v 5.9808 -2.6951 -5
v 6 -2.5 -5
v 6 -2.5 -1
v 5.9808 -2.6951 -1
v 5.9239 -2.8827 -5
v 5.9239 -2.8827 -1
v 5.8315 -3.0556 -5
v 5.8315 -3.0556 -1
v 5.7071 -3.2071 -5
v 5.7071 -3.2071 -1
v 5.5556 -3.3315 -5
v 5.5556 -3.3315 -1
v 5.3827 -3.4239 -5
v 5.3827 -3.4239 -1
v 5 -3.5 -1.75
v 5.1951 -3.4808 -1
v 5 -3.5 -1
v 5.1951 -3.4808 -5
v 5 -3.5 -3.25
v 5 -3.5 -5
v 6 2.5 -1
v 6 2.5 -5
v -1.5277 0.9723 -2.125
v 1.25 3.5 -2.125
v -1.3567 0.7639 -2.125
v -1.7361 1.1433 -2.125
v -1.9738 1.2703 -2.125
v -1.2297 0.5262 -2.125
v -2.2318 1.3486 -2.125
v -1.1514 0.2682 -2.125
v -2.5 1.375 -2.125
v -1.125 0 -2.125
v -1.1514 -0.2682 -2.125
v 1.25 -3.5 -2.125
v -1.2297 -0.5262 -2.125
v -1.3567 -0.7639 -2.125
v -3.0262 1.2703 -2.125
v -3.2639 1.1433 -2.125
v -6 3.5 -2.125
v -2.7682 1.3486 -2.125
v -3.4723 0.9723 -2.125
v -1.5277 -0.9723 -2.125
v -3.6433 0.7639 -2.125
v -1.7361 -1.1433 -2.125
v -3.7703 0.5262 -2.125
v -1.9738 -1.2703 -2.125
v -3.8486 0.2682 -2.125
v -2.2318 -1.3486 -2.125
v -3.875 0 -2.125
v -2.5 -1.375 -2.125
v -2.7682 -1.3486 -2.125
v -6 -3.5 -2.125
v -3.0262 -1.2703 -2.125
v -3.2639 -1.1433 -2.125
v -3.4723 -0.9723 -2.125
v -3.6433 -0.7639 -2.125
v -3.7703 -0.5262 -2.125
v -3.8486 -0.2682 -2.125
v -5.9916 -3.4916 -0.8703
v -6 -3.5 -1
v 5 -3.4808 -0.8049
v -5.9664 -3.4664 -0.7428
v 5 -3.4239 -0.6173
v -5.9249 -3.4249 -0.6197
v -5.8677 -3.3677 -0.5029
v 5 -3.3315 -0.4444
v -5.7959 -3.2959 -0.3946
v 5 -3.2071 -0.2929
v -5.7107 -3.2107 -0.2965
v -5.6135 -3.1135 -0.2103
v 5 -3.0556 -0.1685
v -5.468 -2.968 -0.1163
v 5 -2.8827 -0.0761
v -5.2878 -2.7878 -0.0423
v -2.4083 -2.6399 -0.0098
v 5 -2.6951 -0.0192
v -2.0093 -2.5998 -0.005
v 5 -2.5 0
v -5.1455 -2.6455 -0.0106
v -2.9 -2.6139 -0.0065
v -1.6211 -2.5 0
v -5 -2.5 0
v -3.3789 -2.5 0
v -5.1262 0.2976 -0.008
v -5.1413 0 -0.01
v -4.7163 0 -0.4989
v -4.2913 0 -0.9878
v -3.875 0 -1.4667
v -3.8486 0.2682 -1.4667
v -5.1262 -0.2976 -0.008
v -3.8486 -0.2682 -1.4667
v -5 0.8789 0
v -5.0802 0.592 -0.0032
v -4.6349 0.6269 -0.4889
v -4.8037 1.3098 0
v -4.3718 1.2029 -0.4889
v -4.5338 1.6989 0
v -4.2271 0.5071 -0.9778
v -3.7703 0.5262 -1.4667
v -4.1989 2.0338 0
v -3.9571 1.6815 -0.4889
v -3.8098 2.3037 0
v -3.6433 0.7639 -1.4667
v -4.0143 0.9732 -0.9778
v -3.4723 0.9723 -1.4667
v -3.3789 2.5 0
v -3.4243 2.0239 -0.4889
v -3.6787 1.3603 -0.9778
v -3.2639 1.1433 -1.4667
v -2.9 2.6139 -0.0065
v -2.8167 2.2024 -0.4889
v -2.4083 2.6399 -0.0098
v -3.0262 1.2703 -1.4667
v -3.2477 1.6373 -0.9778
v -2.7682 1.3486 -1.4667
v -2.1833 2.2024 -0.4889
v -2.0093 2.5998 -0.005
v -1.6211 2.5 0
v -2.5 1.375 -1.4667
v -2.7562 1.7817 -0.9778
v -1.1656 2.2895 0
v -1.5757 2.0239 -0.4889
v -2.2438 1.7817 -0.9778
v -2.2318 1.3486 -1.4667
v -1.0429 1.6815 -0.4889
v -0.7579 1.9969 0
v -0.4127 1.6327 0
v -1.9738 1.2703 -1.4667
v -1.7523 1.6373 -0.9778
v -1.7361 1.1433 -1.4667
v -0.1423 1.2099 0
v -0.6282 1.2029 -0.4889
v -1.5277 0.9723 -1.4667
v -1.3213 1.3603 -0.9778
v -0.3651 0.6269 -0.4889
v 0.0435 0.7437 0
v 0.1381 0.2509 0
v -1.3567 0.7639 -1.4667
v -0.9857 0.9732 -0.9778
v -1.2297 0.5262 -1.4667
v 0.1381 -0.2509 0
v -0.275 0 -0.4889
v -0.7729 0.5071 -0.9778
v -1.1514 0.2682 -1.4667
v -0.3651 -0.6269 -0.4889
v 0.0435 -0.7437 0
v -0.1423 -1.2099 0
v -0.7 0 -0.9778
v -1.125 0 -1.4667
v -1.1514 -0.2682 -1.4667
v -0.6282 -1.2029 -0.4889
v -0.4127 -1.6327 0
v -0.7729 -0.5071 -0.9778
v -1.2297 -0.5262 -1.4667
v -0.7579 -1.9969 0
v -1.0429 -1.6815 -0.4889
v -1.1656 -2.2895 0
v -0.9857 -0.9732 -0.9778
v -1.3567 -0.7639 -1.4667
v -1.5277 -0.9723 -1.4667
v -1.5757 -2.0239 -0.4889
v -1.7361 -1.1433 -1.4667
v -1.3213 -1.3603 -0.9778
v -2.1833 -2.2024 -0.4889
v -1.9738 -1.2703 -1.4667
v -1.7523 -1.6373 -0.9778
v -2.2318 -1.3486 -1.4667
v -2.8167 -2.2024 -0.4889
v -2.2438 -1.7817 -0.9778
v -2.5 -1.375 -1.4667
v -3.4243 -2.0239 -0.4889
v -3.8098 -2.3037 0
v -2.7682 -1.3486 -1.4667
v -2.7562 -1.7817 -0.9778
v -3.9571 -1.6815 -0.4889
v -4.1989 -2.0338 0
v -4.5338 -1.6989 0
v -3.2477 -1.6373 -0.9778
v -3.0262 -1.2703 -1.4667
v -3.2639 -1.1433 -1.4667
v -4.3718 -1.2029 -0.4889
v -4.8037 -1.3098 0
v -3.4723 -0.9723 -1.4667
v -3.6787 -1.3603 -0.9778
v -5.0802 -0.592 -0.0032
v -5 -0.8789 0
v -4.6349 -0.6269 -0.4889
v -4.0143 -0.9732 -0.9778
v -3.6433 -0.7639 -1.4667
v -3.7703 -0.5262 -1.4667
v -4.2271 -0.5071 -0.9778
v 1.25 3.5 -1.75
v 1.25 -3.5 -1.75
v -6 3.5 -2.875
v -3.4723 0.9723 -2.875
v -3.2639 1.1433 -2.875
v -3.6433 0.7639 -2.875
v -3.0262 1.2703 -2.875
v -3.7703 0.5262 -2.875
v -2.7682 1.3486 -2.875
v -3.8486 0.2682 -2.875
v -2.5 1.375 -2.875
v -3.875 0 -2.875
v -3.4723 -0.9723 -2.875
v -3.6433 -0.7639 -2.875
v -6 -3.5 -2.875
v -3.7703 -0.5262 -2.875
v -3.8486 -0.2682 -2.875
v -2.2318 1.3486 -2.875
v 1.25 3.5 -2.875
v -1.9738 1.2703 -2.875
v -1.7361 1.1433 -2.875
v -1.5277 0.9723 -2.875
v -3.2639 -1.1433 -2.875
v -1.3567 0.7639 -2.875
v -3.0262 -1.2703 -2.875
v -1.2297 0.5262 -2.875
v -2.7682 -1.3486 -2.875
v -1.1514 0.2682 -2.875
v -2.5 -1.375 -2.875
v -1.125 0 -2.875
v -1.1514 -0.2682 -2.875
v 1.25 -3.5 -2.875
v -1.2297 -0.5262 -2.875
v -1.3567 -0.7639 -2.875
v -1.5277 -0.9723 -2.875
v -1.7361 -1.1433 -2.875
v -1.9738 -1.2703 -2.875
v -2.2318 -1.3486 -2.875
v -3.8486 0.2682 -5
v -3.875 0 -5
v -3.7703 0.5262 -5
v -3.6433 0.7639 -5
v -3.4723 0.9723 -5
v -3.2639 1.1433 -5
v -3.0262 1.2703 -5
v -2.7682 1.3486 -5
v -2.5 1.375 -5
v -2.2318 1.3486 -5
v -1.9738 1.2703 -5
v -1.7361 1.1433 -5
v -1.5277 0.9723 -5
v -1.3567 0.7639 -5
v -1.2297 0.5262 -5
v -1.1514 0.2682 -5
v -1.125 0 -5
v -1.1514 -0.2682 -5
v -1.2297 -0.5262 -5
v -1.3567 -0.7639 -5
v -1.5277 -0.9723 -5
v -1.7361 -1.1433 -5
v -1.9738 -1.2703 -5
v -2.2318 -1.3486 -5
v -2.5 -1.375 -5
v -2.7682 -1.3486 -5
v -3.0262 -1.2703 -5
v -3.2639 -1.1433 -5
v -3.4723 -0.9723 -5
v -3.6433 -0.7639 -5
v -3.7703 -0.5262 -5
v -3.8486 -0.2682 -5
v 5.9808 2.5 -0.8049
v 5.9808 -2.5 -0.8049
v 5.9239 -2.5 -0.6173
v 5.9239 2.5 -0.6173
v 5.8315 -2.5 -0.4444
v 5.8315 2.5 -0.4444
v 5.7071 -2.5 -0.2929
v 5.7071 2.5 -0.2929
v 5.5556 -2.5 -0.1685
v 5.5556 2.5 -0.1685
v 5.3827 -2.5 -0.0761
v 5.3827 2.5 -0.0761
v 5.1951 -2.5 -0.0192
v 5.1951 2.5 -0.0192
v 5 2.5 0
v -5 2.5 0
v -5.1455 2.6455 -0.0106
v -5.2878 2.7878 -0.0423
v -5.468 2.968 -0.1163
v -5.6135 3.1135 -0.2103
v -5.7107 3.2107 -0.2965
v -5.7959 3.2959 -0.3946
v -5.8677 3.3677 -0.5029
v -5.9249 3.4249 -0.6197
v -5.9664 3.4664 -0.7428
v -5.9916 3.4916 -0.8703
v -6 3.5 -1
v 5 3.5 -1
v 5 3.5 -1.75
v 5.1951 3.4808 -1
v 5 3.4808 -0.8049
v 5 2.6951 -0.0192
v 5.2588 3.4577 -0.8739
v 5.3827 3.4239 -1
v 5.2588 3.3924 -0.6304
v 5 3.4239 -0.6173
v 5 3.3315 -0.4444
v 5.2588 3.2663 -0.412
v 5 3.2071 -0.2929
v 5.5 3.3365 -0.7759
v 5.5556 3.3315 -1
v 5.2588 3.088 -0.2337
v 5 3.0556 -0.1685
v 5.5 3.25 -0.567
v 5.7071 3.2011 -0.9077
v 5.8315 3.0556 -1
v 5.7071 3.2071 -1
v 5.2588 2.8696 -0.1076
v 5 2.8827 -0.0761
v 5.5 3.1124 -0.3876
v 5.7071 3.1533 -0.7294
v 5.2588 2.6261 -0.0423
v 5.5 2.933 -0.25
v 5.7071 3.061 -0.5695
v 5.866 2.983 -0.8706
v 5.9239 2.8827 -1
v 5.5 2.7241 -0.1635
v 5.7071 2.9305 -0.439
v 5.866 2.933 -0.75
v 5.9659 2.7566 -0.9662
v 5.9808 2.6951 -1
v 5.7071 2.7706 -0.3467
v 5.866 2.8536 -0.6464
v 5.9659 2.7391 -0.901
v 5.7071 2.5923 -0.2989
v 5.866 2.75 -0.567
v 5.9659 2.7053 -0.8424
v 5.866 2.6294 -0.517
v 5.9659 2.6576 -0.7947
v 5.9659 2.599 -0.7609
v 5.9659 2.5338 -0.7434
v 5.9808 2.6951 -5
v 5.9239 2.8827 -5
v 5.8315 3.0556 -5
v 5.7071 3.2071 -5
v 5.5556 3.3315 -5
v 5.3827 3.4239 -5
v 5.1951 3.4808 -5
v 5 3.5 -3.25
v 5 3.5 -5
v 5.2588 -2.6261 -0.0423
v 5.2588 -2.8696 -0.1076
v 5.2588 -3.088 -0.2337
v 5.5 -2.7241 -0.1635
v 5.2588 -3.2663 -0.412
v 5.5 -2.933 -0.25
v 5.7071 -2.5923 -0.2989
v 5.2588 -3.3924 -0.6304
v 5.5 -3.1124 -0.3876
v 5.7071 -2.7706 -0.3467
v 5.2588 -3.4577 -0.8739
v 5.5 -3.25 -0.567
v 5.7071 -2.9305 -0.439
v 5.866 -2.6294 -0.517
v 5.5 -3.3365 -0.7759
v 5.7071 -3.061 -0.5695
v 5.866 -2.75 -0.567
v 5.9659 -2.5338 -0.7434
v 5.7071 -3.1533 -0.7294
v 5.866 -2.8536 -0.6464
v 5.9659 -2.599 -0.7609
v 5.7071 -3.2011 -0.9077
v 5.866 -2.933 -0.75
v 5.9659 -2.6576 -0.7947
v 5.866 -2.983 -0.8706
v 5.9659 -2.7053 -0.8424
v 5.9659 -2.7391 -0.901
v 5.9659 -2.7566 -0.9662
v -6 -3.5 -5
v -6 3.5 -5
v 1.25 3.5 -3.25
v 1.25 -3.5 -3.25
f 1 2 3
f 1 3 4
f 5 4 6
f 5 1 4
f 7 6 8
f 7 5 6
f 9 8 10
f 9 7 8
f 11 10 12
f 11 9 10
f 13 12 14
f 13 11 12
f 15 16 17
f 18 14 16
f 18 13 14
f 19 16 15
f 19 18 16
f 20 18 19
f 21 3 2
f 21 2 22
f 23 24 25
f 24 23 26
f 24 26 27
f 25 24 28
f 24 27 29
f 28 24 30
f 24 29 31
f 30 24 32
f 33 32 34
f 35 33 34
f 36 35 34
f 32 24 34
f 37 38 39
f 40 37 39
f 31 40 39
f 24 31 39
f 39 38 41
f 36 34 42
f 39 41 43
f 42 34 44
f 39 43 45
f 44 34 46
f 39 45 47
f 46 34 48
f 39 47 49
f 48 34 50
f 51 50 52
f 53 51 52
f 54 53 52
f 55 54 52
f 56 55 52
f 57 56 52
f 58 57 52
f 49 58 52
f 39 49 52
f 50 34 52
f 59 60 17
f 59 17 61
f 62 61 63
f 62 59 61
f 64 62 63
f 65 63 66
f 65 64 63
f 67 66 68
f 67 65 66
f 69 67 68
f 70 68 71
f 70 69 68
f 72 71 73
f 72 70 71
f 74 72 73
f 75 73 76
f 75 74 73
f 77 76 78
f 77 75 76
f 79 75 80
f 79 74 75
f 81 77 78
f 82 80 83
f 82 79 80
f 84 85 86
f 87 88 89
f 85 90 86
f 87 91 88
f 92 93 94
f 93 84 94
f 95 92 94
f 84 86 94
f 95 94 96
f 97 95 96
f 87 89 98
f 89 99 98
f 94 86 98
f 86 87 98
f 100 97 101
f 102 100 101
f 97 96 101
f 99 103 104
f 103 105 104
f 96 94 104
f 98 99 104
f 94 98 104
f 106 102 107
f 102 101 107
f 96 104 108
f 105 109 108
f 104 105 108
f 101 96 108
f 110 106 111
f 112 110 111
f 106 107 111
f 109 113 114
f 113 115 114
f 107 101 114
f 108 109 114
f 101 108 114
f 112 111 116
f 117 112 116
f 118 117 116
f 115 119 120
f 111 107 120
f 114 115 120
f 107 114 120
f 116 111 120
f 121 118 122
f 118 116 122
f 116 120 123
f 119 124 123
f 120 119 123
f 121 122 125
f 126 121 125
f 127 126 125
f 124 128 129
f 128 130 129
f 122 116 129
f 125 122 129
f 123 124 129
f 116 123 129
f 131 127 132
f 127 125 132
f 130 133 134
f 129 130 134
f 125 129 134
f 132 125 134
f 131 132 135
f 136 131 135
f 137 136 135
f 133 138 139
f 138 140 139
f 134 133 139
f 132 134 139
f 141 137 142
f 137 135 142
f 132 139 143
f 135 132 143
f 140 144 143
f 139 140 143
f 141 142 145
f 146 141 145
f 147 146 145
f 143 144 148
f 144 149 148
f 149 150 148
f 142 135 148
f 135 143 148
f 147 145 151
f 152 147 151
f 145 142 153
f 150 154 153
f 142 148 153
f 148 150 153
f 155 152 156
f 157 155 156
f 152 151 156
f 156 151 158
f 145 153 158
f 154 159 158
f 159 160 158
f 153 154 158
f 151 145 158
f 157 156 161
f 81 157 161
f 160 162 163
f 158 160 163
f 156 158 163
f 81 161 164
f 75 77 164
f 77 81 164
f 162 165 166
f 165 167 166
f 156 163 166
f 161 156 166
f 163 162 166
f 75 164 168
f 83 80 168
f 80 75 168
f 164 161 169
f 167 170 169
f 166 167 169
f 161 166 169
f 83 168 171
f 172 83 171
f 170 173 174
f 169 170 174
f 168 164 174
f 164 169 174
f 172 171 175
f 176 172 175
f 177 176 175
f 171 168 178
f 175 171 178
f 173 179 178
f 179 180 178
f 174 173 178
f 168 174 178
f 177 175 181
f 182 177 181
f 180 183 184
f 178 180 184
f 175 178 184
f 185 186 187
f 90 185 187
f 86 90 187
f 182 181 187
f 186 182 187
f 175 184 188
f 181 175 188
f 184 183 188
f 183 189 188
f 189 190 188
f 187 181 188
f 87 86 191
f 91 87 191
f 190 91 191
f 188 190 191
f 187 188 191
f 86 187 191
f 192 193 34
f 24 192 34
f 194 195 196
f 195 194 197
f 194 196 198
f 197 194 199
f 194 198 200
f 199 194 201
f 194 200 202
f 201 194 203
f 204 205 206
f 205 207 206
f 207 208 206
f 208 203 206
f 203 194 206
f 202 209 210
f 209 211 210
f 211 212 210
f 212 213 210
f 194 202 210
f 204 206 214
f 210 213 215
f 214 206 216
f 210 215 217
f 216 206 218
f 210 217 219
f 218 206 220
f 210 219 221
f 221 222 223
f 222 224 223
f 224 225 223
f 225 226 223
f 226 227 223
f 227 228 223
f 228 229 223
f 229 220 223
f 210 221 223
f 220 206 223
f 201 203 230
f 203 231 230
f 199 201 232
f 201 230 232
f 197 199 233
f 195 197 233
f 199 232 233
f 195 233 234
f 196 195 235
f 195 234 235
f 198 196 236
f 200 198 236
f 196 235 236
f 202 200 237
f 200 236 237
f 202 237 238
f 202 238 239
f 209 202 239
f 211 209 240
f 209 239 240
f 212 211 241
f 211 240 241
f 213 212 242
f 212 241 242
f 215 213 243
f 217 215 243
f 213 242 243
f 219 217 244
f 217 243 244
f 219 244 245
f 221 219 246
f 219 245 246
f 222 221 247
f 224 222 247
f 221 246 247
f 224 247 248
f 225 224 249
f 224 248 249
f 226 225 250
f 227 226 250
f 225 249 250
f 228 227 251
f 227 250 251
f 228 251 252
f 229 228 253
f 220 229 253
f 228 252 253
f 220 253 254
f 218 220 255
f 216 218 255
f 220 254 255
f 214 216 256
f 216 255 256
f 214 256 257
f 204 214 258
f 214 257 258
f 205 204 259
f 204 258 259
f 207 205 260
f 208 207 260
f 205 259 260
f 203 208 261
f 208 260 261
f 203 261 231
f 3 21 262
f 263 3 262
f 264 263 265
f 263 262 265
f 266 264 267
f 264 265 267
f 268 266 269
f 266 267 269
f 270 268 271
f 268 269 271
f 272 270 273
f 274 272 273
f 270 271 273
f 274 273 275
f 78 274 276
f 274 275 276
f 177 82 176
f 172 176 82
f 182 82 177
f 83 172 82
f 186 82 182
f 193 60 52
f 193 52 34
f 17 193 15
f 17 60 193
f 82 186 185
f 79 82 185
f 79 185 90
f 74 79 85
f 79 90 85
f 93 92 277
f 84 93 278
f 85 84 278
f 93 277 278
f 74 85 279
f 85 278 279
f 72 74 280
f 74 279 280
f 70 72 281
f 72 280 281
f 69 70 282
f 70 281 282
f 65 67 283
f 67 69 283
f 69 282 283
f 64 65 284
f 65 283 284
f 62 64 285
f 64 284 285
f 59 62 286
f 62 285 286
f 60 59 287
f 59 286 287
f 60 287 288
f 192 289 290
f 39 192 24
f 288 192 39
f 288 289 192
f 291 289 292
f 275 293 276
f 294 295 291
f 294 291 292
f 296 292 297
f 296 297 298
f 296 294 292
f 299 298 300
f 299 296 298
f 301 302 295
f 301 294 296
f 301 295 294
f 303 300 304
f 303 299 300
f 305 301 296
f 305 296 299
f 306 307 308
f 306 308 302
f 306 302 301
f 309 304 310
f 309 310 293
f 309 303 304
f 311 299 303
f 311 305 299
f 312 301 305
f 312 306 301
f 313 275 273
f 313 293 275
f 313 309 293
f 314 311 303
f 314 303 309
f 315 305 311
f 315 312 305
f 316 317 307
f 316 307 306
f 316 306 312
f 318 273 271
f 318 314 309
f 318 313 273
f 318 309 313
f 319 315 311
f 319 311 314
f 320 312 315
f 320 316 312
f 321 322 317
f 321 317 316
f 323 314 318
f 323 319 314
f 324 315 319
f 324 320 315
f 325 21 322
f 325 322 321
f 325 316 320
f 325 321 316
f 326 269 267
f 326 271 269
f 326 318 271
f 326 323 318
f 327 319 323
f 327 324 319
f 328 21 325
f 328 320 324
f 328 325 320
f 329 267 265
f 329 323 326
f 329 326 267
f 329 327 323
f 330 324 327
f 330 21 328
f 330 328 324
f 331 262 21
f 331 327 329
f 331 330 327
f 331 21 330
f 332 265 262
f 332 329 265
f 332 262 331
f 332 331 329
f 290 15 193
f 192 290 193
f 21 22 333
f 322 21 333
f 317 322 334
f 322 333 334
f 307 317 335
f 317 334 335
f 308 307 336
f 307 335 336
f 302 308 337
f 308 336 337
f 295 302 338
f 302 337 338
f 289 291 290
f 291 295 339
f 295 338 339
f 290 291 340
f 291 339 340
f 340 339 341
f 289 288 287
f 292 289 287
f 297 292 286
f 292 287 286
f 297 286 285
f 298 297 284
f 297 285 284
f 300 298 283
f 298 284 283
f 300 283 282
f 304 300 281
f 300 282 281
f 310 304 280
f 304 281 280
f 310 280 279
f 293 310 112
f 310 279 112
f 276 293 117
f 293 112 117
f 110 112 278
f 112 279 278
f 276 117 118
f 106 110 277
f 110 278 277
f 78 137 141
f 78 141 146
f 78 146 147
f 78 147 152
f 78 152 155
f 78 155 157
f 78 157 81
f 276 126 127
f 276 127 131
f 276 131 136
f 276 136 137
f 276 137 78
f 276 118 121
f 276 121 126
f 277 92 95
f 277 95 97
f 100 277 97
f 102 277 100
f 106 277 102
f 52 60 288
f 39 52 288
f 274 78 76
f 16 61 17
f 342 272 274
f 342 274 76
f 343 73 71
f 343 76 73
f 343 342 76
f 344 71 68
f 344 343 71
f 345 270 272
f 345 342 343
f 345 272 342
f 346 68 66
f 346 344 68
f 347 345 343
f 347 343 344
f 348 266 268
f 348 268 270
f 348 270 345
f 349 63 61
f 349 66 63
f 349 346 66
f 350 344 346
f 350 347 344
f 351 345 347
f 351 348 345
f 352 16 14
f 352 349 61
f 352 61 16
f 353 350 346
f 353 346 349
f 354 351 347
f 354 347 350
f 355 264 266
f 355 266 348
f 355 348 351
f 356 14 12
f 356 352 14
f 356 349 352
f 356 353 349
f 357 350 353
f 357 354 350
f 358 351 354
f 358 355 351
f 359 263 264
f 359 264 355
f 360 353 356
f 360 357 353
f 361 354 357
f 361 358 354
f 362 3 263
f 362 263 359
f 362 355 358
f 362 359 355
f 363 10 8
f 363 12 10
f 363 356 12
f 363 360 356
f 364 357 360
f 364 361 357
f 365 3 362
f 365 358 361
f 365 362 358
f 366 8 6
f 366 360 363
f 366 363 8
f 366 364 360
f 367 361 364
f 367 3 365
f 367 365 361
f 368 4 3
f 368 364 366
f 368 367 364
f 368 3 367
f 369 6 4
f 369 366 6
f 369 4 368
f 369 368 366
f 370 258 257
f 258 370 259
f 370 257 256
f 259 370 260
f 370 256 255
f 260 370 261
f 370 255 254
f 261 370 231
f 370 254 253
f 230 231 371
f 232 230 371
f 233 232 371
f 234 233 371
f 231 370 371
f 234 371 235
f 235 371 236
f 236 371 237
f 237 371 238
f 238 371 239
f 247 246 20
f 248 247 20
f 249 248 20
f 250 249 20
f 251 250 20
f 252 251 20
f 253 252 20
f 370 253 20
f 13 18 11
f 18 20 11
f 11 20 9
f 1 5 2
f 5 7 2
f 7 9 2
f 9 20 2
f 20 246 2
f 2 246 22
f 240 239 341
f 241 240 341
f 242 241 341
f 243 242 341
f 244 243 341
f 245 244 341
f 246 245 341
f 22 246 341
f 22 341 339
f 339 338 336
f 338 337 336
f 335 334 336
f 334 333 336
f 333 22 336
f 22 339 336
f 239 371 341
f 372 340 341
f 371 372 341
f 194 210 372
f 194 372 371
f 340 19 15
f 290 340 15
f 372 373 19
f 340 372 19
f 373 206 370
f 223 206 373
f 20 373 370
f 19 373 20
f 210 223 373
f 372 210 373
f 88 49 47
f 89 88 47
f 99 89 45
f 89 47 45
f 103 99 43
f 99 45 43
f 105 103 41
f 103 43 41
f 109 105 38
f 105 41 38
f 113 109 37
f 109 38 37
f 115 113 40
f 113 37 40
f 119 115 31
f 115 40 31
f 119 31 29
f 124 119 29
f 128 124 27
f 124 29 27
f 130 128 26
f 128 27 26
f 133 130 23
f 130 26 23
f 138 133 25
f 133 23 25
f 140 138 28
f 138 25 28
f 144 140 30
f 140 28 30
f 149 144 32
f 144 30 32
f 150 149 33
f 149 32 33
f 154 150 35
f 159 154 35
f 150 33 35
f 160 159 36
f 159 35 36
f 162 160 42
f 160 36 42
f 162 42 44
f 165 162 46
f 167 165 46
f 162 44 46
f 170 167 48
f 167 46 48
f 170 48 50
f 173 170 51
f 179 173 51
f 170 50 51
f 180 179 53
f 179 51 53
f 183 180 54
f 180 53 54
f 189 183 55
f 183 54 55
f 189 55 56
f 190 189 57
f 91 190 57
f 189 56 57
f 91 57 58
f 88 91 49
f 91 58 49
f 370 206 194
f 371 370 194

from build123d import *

# Parameters (mm, degrees)
F0_W           = 5
F0_H           = 7
F0_W_2         = 7
F1_DEPTH       = 5
F3_D           = 2.75
F3_CSINK_D     = 5.3
F3_CSINK_ANGLE = 82
F5_DEPTH       = 7
F6_T1_DEPTH    = 12
F6_T3_DEPTH    = 13.5
F6_T5_DEPTH    = 5
F6_T7_DEPTH    = 6.5
F6_S11_W       = 1
F6_S11_H       = 1
F6_T12_DEPTH   = 1
F6_S17_W       = 1
F6_S17_H       = 1
F6_T18_DEPTH   = 1


# Not quite as in the source:
# - a fillet or chamfer that OpenCascade refuses, or shapes differently, is made with other operations: its cross-section is extruded or revolved along the edge and cut away or added


with BuildPart() as f1:
    # F0 (on Top) → F1 (new body)
    with BuildSketch(Plane.XY):
        with Locations((3.5, 0)):
            Rectangle(F0_W, F0_H)
        with Locations((-2.5, 0)):
            Rectangle(F0_W_2, F0_H)
    extrude(amount=-F1_DEPTH)

    # F3 (through all)
    with Locations(Plane.XY):
        with Locations((-2.5, 0)):
            CounterSinkHole(F3_D / 2, F3_CSINK_D / 2, counter_sink_angle=F3_CSINK_ANGLE)

    # F4 (on face) → F5 (cut, through all)
    with BuildSketch(Plane.XZ.offset(3.5)):
        Polygon((1.25, -3.25), (4.9999998882, -3.25), (4.9999998882, -1.75), (1.25, -1.75), (1.25, -2.125), (-6, -2.125), (-6, -2.875), (1.25, -2.875), align=None)
    extrude(amount=-F5_DEPTH, mode=Mode.SUBTRACT)

    # F6: fillet of radius 1 on 6 edges, made by hand

    # F6_s2 → F6_t1 (cut)
    with BuildSketch(Plane.XZ.offset(-6)):
        with BuildLine():
            ThreePointArc((-5, 0), (-5.7071067812, -0.2928932188), (-6, -1))
            Line((-6, -1), (-6, 0))
            Line((-6, 0), (-5, 0))
        make_face()
    extrude(amount=F6_T1_DEPTH, mode=Mode.SUBTRACT)

    # F6_s4 → F6_t3 (cut)
    with BuildSketch(Plane.YZ.offset(-8.5)):
        with BuildLine():
            ThreePointArc((3.5, -1), (3.2071067812, -0.2928932188), (2.5, 0))
            Line((2.5, 0), (3.5, 0))
            Line((3.5, 0), (3.5, -1))
        make_face()
        with BuildLine():
            ThreePointArc((-3.5, -1), (-3.2071067812, -0.2928932188), (-2.5, 0))
            Line((-2.5, 0), (-3.5, 0))
            Line((-3.5, 0), (-3.5, -1))
        make_face()
    extrude(amount=F6_T3_DEPTH, mode=Mode.SUBTRACT)

    # F6_s6 → F6_t5 (cut)
    with BuildSketch(Plane.XZ.offset(-2.5)):
        with BuildLine():
            ThreePointArc((6, -1), (5.7071067812, -0.2928932188), (5, 0))
            Line((5, 0), (6, 0))
            Line((6, 0), (6, -1))
        make_face()
    extrude(amount=F6_T5_DEPTH, mode=Mode.SUBTRACT)

    # F6_s8 → F6_t7 (cut)
    with BuildSketch(Plane.XY.offset(-7.5)):
        with BuildLine():
            ThreePointArc((6, -2.5), (5.7071067812, -3.2071067812), (5, -3.5))
            Line((5, -3.5), (6, -3.5))
            Line((6, -3.5), (6, -2.5))
        make_face()
        with BuildLine():
            ThreePointArc((6, 2.5), (5.7071067812, 3.2071067812), (5, 3.5))
            Line((5, 3.5), (6, 3.5))
            Line((6, 3.5), (6, 2.5))
        make_face()
    extrude(amount=F6_T7_DEPTH, mode=Mode.SUBTRACT)


with BuildPart() as f6_tool10:
    # F6_s11 → F6_t12 (new body)
    with BuildSketch(Plane.YZ.offset(5)):
        with Locations((3, -0.5)):
            Rectangle(F6_S11_W, F6_S11_H)
    extrude(amount=F6_T12_DEPTH)

    # F6_s13 → F6_t14 (revolve, cut)
    with BuildSketch(Plane(origin=(5, 2.5, -1), x_dir=(0, -0.7071067812, -0.7071067812), z_dir=(0, -0.7071067812, 0.7071067812))):
        with BuildLine():
            ThreePointArc((0, -1), (1, 0), (0, 1))
            Line((0, 1), (0, -1))
        make_face()
    revolve(axis=Axis((5, 2.5, -1), (1, 0, 0)), mode=Mode.SUBTRACT)


with BuildPart() as f1_1:
    add(f1.part)

    # F6_t9: cut F6_tool10
    add(f6_tool10.part, mode=Mode.SUBTRACT)


with BuildPart() as f6_tool16:
    # F6_s17 → F6_t18 (new body)
    with BuildSketch(Plane.YZ.offset(5)):
        with Locations((-3, -0.5)):
            Rectangle(F6_S17_W, F6_S17_H)
    extrude(amount=F6_T18_DEPTH)

    # F6_s19 → F6_t20 (revolve, cut)
    with BuildSketch(Plane(origin=(5, -2.5, -1), x_dir=(0, 0.7071067812, -0.7071067812), z_dir=(0, -0.7071067812, -0.7071067812))):
        with BuildLine():
            ThreePointArc((0, -1), (1, 0), (0, 1))
            Line((0, 1), (0, -1))
        make_face()
    revolve(axis=Axis((5, -2.5, -1), (1, 0, 0)), mode=Mode.SUBTRACT)


with BuildPart() as f1_2:
    add(f1_1.part)

    # F6_t15: cut F6_tool16
    add(f6_tool16.part, mode=Mode.SUBTRACT)


solid = f1_2.part
